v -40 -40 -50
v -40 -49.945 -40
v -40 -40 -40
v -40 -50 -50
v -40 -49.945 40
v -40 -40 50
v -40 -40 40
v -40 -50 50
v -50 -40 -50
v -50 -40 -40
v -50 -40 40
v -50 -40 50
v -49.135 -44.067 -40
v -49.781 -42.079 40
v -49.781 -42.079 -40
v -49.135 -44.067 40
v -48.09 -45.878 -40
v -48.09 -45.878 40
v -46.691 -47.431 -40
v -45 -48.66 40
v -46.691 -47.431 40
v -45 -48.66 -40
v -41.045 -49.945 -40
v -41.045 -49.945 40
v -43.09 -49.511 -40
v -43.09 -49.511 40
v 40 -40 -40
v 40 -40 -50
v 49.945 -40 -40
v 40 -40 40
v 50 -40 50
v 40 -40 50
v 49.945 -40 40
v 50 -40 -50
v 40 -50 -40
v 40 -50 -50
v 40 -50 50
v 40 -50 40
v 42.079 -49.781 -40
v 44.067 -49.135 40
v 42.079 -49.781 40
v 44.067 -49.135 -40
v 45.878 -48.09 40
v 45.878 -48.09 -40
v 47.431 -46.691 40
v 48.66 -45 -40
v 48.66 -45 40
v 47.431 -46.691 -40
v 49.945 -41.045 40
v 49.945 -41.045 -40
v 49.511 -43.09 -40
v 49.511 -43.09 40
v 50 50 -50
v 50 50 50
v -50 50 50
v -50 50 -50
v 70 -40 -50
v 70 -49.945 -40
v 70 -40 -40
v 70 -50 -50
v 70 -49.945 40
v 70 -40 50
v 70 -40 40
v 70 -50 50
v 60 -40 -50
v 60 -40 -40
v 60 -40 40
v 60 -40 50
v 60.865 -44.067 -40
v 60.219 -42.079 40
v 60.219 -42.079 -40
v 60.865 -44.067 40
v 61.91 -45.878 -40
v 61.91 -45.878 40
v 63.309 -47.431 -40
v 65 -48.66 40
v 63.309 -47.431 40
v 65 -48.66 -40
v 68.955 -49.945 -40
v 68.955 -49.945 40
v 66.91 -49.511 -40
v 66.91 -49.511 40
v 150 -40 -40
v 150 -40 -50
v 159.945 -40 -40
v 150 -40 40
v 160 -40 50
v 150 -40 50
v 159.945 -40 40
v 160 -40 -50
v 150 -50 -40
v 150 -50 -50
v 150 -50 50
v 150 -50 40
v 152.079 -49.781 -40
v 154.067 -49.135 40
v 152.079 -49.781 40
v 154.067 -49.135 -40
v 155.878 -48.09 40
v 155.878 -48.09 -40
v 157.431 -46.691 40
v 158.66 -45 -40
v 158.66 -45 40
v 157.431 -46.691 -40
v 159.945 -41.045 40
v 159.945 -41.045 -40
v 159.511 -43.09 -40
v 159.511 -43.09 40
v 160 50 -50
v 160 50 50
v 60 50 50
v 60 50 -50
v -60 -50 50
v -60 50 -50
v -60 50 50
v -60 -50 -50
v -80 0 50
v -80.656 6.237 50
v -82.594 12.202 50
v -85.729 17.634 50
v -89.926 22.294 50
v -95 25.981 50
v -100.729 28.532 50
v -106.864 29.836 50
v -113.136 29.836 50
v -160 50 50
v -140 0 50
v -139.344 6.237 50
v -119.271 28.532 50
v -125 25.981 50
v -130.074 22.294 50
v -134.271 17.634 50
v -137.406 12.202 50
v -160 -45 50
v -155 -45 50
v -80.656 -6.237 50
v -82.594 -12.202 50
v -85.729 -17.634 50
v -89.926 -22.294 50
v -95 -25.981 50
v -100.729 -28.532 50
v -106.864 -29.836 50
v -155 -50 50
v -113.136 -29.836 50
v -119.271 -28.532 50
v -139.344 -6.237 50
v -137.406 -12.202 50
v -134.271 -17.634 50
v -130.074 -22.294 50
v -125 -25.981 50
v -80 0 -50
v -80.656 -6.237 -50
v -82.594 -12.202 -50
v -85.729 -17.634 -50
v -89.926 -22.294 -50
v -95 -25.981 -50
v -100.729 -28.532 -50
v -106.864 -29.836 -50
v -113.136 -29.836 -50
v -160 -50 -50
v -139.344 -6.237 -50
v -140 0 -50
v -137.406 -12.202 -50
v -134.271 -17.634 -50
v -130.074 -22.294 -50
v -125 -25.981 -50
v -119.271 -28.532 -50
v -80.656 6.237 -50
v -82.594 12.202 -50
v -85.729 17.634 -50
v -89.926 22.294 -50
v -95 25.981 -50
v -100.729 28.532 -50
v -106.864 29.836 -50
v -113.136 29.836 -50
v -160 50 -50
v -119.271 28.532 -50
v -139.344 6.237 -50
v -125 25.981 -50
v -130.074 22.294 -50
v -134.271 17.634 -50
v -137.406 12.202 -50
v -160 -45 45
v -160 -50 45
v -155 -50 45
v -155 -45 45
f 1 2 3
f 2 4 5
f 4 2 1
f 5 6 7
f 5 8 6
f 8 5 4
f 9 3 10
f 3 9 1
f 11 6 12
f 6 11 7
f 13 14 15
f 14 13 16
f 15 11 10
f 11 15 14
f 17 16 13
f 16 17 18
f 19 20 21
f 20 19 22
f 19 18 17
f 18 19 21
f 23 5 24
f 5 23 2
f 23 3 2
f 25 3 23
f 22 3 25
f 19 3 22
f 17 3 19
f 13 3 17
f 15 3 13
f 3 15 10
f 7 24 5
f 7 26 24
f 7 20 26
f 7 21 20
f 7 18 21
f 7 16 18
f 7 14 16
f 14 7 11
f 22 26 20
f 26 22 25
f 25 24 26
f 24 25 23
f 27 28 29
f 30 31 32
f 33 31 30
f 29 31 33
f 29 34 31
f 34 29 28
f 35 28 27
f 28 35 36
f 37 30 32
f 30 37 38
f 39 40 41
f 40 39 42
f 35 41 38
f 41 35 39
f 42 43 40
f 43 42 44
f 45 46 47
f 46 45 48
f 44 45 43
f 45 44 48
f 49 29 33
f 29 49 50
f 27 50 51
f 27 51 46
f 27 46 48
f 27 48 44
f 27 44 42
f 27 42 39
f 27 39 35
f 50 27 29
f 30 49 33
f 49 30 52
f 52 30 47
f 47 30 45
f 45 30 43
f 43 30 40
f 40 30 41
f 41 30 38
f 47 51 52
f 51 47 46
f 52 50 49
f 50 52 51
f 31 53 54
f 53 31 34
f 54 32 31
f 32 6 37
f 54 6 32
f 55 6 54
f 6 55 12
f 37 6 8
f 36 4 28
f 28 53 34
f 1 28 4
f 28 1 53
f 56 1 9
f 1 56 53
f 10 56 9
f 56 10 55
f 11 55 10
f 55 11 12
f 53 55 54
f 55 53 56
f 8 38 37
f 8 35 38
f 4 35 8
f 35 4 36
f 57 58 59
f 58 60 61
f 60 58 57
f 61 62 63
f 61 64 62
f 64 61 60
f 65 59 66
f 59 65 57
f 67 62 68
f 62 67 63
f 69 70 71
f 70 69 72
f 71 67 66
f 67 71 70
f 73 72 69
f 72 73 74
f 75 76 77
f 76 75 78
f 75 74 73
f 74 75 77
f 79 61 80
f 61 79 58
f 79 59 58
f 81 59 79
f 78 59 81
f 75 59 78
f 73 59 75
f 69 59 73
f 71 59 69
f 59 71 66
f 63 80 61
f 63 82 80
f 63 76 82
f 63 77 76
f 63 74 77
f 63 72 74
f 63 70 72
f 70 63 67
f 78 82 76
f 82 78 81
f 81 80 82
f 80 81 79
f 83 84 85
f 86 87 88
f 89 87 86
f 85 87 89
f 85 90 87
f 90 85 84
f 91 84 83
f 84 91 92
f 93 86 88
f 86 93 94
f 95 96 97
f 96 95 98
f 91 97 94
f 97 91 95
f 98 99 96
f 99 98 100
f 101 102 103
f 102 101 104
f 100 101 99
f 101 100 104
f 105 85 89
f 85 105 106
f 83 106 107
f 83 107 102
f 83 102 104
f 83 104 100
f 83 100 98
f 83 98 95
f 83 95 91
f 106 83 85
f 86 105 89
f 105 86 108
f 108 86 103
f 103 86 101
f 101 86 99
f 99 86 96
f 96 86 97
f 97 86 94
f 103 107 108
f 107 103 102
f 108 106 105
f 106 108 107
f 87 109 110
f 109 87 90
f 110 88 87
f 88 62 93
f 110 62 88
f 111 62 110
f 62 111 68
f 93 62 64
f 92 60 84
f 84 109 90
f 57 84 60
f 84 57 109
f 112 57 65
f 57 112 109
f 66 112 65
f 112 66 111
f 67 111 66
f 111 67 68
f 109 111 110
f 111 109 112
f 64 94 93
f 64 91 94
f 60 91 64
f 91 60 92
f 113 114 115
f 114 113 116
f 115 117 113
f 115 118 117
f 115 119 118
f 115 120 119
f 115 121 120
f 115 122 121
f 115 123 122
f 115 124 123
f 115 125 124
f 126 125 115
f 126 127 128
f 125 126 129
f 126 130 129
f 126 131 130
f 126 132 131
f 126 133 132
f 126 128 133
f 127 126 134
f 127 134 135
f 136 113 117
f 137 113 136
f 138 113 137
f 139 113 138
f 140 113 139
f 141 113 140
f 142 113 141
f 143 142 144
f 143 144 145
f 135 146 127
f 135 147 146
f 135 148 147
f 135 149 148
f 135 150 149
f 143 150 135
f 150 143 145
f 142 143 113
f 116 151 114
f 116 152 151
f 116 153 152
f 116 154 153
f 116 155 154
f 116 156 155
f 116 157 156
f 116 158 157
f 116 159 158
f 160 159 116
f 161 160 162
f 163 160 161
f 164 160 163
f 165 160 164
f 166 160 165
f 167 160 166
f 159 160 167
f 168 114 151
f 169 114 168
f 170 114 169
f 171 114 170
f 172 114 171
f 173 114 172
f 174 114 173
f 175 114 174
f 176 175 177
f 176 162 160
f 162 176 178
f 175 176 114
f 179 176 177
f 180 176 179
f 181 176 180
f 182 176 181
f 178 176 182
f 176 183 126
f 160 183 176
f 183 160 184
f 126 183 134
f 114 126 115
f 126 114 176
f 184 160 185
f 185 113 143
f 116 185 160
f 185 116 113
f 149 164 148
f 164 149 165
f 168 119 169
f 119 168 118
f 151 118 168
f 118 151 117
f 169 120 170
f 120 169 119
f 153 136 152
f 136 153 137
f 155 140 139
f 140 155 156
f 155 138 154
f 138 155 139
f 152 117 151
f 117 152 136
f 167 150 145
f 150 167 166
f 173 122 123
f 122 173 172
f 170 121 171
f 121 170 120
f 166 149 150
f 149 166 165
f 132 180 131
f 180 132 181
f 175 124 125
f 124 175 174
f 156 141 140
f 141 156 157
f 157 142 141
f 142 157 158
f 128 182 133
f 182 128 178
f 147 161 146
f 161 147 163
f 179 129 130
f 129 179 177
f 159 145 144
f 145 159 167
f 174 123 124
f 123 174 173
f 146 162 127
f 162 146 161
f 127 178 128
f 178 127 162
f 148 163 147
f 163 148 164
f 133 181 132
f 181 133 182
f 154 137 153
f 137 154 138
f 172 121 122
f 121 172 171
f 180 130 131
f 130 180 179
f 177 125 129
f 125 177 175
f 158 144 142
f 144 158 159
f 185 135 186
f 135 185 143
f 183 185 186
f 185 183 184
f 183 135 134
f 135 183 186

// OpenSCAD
// Volume: 2704143.6373071996, SurfaceArea: 191660.13894271746
module edgeprofile()
{
  difference() {
    cube([20, 20, 150], center = true);
    translate([-10, -10, 0]) cylinder(h = 80, r = 10, center = true);
  }
}

module rendered_edgeprofile()
{
  render(convexity = 2) edgeprofile();
}

module mycube() {
  difference() {
    cube(100, center = true);
    translate([ -50, -50, 0 ]) rotate(180, [0, 0, 1]) edgeprofile();
    translate([ 50, -50, 0 ]) rotate(270, [0, 0, 1]) edgeprofile();
  }
}

module rendered_mycube() {
  difference() {
    cube(100, center = true);
    translate([ -50, -50, 0 ]) rotate(180, [0, 0, 1]) rendered_edgeprofile();
    translate([ 50, -50, 0 ]) rotate(270, [0, 0, 1]) rendered_edgeprofile();
  }
}

// Empty
render();
// No children
render() { }

mycube();

translate([110,0,0]) rendered_mycube();

// This may trigger a convexity issue
translate([-110,0,0]) {
  difference() {
    render(convexity=2) difference() {
      cube(100, center = true);
      cylinder(r=30,h=110,center=true);
    }
    translate([-55, -55, 45]) cube(10);
  }
}
